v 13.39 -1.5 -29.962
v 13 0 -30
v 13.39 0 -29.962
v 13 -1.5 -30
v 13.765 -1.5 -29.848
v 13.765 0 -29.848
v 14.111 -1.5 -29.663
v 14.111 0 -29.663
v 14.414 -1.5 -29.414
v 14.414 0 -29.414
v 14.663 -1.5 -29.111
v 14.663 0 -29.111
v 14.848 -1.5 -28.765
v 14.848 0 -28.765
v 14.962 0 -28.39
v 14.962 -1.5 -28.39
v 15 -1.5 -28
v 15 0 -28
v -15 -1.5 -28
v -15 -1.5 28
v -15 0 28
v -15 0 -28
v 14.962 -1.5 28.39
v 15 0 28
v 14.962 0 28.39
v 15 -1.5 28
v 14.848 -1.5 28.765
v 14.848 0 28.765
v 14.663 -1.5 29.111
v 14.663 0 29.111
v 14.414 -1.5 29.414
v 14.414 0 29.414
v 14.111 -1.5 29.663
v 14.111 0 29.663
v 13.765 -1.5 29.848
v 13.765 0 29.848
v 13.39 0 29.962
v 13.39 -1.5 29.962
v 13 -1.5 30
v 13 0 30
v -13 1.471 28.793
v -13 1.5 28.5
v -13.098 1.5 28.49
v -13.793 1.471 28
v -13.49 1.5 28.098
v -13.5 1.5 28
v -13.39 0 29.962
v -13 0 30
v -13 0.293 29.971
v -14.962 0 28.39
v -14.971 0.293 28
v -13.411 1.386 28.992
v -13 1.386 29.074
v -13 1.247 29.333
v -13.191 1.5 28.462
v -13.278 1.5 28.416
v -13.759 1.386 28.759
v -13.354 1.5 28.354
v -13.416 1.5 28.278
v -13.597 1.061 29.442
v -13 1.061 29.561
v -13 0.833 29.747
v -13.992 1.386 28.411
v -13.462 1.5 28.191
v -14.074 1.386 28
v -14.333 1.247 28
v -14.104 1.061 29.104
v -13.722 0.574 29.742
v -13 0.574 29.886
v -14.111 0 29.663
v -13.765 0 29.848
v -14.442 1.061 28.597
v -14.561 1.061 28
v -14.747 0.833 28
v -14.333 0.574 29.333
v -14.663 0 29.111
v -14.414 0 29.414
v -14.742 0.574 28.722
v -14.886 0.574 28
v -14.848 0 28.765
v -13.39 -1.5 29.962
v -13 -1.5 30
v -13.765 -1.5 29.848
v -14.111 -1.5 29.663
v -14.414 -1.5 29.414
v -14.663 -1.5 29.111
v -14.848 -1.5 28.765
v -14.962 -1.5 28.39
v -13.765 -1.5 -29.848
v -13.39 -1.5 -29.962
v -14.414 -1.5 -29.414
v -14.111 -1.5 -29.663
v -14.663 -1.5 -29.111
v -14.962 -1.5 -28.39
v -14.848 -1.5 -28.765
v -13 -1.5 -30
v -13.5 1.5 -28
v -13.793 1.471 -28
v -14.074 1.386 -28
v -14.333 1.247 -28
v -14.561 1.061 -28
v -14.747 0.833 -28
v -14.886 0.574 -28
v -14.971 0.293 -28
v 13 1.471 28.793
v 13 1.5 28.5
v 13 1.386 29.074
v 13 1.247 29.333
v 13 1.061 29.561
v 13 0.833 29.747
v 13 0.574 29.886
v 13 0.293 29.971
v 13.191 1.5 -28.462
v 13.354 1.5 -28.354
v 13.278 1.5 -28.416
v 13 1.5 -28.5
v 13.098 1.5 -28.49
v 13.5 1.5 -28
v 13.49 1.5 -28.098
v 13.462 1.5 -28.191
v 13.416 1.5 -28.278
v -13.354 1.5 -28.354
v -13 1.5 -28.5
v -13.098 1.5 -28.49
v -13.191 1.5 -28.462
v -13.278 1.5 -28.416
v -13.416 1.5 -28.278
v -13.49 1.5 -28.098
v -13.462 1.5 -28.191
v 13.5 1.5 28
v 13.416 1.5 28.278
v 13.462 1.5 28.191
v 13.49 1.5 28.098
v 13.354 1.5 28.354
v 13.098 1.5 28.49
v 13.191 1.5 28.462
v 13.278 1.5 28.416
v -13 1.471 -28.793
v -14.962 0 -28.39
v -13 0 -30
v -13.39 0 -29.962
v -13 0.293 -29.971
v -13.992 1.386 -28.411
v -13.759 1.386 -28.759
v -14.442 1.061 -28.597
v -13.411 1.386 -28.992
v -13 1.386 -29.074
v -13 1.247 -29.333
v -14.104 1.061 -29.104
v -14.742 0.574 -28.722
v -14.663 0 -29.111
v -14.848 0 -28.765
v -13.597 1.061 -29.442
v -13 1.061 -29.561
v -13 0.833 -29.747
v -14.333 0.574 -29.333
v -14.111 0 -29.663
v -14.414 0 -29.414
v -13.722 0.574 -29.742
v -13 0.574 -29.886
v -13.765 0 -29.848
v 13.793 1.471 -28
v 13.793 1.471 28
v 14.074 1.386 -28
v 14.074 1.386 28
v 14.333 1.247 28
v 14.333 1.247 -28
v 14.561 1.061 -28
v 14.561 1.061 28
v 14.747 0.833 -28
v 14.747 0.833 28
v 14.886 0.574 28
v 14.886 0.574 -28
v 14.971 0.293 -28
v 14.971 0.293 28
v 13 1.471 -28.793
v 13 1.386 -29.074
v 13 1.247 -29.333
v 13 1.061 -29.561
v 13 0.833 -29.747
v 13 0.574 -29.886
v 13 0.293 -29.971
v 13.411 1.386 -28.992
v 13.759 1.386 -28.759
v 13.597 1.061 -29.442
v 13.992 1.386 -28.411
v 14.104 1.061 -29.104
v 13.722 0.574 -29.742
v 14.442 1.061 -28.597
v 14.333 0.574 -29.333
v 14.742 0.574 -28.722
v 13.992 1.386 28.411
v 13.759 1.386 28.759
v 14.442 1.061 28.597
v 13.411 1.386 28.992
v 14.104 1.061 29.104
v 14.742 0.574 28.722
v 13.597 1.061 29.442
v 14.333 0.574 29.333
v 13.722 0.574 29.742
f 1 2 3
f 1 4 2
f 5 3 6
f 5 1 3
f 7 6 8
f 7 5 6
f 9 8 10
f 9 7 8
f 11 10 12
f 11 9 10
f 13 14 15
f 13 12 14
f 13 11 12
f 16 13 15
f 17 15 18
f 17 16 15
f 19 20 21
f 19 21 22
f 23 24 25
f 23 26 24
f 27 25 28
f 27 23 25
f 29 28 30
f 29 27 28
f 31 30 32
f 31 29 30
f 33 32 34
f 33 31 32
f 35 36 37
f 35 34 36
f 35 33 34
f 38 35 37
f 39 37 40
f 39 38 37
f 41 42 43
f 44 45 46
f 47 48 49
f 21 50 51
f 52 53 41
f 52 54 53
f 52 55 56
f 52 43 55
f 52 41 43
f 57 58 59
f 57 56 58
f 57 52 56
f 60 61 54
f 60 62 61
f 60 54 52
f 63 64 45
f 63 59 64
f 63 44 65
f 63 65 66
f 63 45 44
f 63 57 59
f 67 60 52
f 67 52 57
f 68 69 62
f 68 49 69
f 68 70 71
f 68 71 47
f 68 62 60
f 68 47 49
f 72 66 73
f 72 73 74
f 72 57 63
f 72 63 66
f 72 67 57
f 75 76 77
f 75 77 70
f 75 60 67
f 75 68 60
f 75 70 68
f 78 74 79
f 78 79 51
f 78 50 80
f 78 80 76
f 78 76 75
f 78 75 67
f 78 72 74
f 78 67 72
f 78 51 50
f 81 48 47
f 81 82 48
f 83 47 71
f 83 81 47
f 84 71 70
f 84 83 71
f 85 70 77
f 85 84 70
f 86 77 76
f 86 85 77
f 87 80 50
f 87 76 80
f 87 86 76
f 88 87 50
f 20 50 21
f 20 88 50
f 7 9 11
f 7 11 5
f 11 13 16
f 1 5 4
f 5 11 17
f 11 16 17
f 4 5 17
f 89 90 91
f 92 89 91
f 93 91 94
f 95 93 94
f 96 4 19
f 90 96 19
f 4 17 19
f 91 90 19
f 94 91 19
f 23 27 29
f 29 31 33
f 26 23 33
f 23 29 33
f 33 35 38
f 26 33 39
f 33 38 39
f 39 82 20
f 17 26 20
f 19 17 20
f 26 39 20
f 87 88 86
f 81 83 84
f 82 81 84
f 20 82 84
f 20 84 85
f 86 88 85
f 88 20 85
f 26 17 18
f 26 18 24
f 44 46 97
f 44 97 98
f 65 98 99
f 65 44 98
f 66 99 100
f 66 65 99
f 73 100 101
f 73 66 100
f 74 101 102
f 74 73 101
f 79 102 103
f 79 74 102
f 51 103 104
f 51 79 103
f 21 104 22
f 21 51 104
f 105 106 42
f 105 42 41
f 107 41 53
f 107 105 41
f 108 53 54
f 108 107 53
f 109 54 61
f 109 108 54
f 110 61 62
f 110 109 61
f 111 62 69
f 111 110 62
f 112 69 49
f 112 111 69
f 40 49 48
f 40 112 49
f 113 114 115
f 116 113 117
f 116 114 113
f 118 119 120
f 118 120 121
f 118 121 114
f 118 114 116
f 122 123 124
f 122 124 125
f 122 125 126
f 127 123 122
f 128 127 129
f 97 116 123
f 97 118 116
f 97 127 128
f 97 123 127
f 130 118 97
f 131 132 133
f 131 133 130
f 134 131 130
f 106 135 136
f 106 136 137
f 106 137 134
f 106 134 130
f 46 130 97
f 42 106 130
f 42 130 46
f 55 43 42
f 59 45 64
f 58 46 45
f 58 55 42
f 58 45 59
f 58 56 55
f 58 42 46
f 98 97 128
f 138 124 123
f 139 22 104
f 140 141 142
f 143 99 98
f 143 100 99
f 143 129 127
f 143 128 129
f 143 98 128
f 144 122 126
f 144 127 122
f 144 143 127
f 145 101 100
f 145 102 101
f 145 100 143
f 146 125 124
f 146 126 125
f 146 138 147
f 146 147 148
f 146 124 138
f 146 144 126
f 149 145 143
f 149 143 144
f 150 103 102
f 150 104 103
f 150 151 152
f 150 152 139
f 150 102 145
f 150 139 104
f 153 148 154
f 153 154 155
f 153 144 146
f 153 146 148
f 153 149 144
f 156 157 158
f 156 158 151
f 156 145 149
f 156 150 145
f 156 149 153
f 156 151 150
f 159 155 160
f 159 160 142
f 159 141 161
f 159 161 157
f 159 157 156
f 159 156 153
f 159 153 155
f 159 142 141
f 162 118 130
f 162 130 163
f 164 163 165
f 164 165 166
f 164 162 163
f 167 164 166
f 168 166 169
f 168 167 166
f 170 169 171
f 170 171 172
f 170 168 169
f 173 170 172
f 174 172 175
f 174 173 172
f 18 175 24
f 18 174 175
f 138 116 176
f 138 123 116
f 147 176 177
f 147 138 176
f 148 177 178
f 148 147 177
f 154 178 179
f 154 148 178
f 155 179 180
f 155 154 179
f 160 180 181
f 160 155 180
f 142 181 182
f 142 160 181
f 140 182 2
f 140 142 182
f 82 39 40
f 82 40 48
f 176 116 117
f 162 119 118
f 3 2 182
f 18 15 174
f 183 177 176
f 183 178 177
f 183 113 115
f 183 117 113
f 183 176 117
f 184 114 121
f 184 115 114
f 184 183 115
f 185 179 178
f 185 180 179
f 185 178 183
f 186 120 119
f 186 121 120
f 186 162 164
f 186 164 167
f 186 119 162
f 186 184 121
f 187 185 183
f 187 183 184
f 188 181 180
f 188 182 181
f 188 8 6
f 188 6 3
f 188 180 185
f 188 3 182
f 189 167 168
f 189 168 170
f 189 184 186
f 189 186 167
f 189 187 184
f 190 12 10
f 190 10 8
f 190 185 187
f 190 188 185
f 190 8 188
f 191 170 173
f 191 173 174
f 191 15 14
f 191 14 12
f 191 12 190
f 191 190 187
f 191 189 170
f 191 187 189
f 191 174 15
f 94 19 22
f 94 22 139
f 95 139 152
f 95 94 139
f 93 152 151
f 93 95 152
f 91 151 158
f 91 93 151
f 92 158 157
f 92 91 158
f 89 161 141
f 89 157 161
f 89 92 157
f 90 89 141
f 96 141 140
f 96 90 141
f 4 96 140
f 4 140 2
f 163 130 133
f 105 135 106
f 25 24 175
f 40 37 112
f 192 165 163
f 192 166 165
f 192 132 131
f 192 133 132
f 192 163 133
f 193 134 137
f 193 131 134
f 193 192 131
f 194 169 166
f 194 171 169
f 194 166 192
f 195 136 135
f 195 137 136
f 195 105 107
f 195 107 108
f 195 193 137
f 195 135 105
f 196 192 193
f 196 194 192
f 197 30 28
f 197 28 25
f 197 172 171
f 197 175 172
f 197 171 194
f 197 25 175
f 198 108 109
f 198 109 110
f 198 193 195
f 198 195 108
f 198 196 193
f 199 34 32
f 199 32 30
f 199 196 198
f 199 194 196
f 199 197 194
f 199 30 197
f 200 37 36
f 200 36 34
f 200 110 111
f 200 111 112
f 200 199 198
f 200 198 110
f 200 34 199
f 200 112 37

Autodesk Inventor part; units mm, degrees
ref_plane "YZ Plane" through (0, 0, 0) normal (1, 0, 0) x (0, 1, 0)
ref_plane "XZ Plane" through (0, 0, 0) normal (0, 1, 0) x (-1, 0, 0)
ref_plane "XY Plane" through (0, 0, 0) normal (0, 0, 1) x (1, 0, 0)
sketch "Sketch1" plane through (0, 0, 0) normal (0, 1, 0) x (-1, 0, 0)
  line L0 (-13, 30) -> (13, 30)
  line L1 (15, 28) -> (15, -28)
  line L2 (13, -30) -> (-13, -30)
  line L3 (-15, -28) -> (-15, 28)
  line L4 (-15, 30) -> (15, -30) construction
  line L5 (15, 30) -> (-15, -30) construction
  arc A0 (15, 28) -> (13, 30) centre (13, 28) ccw
  arc A1 (13, -30) -> (15, -28) centre (13, -28) ccw
  arc A2 (-15, -28) -> (-13, -30) centre (-13, -28) ccw
  arc A3 (-13, 30) -> (-15, 28) centre (-13, 28) ccw
  point P0 (0, 0)
  dimension "d0" = 60
  dimension "d1" = 30
  dimension "d4" = 2
  dimension "d5" = 2
extrude "Extrusion1" add sketch "Sketch1" along normal mid plane 3
fillet "Fillet1" radius 1.5 8 edges at (14.4142, 1.5, -29.4142) (0, 1.5, -30) (-14.4142, 1.5, -29.4142) (-15, 1.5, 0) (-14.4142, 1.5, 29.4142) (0, 1.5, 30) (14.4142, 1.5, 29.4142) (15, 1.5, 0)
properties part number "END CAP 3060"
